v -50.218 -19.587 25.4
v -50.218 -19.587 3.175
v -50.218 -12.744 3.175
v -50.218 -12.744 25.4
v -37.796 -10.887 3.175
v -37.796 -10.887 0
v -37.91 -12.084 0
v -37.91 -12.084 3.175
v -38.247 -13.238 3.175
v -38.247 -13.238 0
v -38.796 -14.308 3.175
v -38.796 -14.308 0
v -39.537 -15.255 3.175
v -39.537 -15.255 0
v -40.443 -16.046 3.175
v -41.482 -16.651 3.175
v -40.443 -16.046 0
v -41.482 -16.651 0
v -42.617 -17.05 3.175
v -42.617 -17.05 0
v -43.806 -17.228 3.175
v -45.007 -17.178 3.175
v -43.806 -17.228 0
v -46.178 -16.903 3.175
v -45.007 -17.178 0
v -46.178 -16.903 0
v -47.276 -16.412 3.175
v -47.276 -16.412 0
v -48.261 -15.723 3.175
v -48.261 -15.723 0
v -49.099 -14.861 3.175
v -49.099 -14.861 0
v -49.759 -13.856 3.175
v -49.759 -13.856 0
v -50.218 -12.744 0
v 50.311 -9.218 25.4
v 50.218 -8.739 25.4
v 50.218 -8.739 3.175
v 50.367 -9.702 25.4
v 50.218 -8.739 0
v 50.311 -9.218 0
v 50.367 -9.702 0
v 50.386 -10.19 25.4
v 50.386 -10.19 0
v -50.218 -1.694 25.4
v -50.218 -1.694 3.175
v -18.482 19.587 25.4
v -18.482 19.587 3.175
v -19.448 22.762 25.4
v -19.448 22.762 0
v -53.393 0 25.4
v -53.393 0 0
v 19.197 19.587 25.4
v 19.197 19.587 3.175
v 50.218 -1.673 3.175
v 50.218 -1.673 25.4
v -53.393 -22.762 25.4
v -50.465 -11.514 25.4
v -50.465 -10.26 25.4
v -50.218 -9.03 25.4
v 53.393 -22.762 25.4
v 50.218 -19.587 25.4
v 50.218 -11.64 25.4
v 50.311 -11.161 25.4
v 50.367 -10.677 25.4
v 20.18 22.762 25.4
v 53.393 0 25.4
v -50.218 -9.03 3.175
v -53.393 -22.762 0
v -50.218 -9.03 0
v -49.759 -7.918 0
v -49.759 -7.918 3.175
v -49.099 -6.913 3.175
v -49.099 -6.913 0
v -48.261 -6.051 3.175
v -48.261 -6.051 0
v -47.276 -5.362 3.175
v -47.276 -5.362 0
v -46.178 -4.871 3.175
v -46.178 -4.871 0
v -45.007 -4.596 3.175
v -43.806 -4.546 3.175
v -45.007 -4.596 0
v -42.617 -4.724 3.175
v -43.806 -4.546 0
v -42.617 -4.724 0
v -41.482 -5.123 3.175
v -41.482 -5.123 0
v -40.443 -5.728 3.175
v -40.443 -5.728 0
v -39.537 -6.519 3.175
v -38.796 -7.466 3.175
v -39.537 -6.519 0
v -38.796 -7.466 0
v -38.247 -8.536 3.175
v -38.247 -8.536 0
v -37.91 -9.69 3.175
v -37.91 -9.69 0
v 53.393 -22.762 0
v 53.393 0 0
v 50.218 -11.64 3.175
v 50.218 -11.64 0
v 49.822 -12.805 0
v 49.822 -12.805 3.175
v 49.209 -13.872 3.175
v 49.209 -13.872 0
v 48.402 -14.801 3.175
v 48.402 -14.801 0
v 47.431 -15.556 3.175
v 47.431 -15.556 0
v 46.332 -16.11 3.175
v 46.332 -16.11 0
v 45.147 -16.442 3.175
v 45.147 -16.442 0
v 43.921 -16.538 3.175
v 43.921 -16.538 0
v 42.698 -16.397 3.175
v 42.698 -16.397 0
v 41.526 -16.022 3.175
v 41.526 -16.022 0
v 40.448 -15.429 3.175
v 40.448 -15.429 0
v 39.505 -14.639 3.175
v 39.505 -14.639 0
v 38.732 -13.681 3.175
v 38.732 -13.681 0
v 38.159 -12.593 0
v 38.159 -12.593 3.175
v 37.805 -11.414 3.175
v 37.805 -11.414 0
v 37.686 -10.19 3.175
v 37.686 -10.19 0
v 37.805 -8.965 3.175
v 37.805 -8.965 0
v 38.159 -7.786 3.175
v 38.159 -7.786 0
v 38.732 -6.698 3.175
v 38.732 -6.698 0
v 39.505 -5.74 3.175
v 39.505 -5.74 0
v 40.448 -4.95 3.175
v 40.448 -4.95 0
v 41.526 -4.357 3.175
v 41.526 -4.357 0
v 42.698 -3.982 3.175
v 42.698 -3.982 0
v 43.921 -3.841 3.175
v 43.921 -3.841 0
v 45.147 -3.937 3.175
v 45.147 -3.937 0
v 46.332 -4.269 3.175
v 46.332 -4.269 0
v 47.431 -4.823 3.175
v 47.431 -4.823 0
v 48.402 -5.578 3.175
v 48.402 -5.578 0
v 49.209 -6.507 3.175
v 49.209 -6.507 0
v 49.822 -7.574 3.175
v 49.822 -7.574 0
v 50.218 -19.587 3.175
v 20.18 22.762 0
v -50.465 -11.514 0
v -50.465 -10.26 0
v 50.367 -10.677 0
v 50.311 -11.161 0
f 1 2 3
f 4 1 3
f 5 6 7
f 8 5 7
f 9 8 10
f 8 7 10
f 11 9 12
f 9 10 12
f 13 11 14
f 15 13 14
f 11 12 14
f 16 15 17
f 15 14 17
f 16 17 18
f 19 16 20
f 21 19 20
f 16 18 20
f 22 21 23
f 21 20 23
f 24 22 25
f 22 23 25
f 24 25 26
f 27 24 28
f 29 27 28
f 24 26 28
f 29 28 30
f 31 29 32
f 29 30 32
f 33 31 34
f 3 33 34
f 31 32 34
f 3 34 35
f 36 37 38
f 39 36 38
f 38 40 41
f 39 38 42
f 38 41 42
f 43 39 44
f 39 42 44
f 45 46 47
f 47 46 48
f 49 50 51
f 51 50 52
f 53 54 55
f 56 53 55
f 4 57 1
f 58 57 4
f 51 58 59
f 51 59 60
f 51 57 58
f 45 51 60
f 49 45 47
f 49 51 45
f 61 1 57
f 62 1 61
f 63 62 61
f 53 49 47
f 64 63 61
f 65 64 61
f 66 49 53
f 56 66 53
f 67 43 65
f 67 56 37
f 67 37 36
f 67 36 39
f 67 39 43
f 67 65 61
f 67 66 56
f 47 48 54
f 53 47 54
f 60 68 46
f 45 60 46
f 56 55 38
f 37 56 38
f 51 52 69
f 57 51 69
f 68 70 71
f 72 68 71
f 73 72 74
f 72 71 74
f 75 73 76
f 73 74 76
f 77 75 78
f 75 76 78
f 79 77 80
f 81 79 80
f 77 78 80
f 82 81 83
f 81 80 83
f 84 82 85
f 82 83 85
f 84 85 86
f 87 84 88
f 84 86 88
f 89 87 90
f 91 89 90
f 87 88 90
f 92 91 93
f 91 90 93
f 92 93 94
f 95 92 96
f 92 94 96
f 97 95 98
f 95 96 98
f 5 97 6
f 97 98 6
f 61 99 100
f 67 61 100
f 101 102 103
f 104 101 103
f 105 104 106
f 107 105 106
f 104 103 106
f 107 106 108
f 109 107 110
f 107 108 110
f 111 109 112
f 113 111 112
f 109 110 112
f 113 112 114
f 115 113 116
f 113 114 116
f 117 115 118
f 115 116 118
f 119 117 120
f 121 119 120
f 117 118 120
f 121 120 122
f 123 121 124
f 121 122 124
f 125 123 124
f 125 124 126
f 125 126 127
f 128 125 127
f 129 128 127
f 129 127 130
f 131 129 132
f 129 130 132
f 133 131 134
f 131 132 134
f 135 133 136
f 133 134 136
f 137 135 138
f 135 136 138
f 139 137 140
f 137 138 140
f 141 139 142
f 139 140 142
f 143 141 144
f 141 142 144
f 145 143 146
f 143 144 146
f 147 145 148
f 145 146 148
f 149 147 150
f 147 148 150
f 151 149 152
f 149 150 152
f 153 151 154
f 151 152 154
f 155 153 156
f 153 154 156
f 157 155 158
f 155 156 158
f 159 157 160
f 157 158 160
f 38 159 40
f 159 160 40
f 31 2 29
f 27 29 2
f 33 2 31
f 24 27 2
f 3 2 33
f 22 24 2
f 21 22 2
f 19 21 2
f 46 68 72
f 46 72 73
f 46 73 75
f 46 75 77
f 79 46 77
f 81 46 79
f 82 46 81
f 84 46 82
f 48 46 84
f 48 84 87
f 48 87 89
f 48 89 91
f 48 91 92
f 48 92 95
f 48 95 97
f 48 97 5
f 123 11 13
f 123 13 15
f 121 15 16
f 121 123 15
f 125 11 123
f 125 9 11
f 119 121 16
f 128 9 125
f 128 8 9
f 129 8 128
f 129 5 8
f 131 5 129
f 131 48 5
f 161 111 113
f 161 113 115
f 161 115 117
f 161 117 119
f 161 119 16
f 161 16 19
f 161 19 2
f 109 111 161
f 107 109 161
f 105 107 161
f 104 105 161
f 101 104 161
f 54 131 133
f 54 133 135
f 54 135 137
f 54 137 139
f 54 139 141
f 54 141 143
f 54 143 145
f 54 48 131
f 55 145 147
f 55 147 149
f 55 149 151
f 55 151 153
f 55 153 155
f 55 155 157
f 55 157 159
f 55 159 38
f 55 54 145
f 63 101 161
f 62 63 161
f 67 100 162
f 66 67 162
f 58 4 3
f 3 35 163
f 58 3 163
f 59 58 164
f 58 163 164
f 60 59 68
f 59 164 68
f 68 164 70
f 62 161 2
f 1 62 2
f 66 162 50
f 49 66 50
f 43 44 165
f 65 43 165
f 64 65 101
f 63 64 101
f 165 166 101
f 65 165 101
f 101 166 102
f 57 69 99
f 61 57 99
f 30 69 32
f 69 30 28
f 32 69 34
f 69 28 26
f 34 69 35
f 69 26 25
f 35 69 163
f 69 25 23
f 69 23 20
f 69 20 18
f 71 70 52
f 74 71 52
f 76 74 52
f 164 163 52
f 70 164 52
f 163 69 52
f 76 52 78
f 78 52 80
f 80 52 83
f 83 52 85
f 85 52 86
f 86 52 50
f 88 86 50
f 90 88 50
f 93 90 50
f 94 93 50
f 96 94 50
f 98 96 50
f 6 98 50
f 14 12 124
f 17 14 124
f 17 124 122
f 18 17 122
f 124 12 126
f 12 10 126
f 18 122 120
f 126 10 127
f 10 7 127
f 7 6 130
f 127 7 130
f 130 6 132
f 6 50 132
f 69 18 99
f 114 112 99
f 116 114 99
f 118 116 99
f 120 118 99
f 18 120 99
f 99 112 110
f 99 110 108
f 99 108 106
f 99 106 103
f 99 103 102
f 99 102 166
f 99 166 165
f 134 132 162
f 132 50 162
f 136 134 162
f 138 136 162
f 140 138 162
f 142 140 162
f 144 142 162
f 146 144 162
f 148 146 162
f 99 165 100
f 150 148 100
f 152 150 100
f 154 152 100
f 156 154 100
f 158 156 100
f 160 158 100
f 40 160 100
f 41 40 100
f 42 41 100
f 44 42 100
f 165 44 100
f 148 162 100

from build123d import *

# Parameters (mm, degrees)
F1_DEPTH = 25.4
F2_DEPTH = 3.175


with BuildPart() as f1:
    # F0 (on Top) → F1 (new body)
    with BuildSketch(Plane.XY):
        Polygon((-53.3932372928, -22.7622538805), (53.3932372928, -22.7622538805), (53.3932372928, 0), (20.1804766856, 22.7622538805), (-19.4478705525, 22.7622538805), (-53.3932372928, 0), align=None)
        with BuildLine():
            Line((50.2182372928, -11.6402664429), (50.2182372928, -19.5872538805))
            Line((50.2182372928, -19.5872538805), (-50.2182372928, -19.5872538805))
            Line((-50.2182372928, -19.5872538805), (-50.2182372928, -12.7441667186))
            ThreePointArc((-50.2182372928, -12.7441667186), (-50.4958895802, -10.8869932592), (-50.2182372928, -9.0298197998))
            Line((-50.2182372928, -9.0298197998), (-50.2182372928, -1.6937240379))
            Line((-50.2182372928, -1.6937240379), (-18.4818985354, 19.5872538805))
            Line((-18.4818985354, 19.5872538805), (19.1969012537, 19.5872538805))
            Line((19.1969012537, 19.5872538805), (50.2182372928, -1.6731145359))
            Line((50.2182372928, -1.6731145359), (50.2182372928, -8.7388372773))
            ThreePointArc((50.2182372928, -8.7388372773), (50.3440488555, -9.459350693), (50.3861723304, -10.1895518601))
            ThreePointArc((50.3861723304, -10.1895518601), (50.3440488555, -10.9197530272), (50.2182372928, -11.6402664429))
        make_face(mode=Mode.SUBTRACT)
    extrude(amount=F1_DEPTH)

    # F0 (on Top) → F2 (join)
    with BuildSketch(Plane.XY):
        with BuildLine():
            Line((-50.2182372928, -19.5872538805), (50.2182372928, -19.5872538805))
            Line((50.2182372928, -19.5872538805), (50.2182372928, -11.6402664429))
            ThreePointArc((50.2182372928, -11.6402664429), (37.6861723304, -10.1895518601), (50.2182372928, -8.7388372773))
            Line((50.2182372928, -8.7388372773), (50.2182372928, -1.6731145359))
            Line((50.2182372928, -1.6731145359), (19.1969012537, 19.5872538805))
            Line((19.1969012537, 19.5872538805), (-18.4818985354, 19.5872538805))
            Line((-18.4818985354, 19.5872538805), (-50.2182372928, -1.6937240379))
            Line((-50.2182372928, -1.6937240379), (-50.2182372928, -9.0298197998))
            ThreePointArc((-50.2182372928, -9.0298197998), (-43.2069827623, -4.6067899196), (-37.7958895802, -10.8869932592))
            ThreePointArc((-37.7958895802, -10.8869932592), (-43.2069827623, -17.1671965988), (-50.2182372928, -12.7441667186))
            Line((-50.2182372928, -12.7441667186), (-50.2182372928, -19.5872538805))
        make_face()
    extrude(amount=F2_DEPTH)


solid = f1.part
